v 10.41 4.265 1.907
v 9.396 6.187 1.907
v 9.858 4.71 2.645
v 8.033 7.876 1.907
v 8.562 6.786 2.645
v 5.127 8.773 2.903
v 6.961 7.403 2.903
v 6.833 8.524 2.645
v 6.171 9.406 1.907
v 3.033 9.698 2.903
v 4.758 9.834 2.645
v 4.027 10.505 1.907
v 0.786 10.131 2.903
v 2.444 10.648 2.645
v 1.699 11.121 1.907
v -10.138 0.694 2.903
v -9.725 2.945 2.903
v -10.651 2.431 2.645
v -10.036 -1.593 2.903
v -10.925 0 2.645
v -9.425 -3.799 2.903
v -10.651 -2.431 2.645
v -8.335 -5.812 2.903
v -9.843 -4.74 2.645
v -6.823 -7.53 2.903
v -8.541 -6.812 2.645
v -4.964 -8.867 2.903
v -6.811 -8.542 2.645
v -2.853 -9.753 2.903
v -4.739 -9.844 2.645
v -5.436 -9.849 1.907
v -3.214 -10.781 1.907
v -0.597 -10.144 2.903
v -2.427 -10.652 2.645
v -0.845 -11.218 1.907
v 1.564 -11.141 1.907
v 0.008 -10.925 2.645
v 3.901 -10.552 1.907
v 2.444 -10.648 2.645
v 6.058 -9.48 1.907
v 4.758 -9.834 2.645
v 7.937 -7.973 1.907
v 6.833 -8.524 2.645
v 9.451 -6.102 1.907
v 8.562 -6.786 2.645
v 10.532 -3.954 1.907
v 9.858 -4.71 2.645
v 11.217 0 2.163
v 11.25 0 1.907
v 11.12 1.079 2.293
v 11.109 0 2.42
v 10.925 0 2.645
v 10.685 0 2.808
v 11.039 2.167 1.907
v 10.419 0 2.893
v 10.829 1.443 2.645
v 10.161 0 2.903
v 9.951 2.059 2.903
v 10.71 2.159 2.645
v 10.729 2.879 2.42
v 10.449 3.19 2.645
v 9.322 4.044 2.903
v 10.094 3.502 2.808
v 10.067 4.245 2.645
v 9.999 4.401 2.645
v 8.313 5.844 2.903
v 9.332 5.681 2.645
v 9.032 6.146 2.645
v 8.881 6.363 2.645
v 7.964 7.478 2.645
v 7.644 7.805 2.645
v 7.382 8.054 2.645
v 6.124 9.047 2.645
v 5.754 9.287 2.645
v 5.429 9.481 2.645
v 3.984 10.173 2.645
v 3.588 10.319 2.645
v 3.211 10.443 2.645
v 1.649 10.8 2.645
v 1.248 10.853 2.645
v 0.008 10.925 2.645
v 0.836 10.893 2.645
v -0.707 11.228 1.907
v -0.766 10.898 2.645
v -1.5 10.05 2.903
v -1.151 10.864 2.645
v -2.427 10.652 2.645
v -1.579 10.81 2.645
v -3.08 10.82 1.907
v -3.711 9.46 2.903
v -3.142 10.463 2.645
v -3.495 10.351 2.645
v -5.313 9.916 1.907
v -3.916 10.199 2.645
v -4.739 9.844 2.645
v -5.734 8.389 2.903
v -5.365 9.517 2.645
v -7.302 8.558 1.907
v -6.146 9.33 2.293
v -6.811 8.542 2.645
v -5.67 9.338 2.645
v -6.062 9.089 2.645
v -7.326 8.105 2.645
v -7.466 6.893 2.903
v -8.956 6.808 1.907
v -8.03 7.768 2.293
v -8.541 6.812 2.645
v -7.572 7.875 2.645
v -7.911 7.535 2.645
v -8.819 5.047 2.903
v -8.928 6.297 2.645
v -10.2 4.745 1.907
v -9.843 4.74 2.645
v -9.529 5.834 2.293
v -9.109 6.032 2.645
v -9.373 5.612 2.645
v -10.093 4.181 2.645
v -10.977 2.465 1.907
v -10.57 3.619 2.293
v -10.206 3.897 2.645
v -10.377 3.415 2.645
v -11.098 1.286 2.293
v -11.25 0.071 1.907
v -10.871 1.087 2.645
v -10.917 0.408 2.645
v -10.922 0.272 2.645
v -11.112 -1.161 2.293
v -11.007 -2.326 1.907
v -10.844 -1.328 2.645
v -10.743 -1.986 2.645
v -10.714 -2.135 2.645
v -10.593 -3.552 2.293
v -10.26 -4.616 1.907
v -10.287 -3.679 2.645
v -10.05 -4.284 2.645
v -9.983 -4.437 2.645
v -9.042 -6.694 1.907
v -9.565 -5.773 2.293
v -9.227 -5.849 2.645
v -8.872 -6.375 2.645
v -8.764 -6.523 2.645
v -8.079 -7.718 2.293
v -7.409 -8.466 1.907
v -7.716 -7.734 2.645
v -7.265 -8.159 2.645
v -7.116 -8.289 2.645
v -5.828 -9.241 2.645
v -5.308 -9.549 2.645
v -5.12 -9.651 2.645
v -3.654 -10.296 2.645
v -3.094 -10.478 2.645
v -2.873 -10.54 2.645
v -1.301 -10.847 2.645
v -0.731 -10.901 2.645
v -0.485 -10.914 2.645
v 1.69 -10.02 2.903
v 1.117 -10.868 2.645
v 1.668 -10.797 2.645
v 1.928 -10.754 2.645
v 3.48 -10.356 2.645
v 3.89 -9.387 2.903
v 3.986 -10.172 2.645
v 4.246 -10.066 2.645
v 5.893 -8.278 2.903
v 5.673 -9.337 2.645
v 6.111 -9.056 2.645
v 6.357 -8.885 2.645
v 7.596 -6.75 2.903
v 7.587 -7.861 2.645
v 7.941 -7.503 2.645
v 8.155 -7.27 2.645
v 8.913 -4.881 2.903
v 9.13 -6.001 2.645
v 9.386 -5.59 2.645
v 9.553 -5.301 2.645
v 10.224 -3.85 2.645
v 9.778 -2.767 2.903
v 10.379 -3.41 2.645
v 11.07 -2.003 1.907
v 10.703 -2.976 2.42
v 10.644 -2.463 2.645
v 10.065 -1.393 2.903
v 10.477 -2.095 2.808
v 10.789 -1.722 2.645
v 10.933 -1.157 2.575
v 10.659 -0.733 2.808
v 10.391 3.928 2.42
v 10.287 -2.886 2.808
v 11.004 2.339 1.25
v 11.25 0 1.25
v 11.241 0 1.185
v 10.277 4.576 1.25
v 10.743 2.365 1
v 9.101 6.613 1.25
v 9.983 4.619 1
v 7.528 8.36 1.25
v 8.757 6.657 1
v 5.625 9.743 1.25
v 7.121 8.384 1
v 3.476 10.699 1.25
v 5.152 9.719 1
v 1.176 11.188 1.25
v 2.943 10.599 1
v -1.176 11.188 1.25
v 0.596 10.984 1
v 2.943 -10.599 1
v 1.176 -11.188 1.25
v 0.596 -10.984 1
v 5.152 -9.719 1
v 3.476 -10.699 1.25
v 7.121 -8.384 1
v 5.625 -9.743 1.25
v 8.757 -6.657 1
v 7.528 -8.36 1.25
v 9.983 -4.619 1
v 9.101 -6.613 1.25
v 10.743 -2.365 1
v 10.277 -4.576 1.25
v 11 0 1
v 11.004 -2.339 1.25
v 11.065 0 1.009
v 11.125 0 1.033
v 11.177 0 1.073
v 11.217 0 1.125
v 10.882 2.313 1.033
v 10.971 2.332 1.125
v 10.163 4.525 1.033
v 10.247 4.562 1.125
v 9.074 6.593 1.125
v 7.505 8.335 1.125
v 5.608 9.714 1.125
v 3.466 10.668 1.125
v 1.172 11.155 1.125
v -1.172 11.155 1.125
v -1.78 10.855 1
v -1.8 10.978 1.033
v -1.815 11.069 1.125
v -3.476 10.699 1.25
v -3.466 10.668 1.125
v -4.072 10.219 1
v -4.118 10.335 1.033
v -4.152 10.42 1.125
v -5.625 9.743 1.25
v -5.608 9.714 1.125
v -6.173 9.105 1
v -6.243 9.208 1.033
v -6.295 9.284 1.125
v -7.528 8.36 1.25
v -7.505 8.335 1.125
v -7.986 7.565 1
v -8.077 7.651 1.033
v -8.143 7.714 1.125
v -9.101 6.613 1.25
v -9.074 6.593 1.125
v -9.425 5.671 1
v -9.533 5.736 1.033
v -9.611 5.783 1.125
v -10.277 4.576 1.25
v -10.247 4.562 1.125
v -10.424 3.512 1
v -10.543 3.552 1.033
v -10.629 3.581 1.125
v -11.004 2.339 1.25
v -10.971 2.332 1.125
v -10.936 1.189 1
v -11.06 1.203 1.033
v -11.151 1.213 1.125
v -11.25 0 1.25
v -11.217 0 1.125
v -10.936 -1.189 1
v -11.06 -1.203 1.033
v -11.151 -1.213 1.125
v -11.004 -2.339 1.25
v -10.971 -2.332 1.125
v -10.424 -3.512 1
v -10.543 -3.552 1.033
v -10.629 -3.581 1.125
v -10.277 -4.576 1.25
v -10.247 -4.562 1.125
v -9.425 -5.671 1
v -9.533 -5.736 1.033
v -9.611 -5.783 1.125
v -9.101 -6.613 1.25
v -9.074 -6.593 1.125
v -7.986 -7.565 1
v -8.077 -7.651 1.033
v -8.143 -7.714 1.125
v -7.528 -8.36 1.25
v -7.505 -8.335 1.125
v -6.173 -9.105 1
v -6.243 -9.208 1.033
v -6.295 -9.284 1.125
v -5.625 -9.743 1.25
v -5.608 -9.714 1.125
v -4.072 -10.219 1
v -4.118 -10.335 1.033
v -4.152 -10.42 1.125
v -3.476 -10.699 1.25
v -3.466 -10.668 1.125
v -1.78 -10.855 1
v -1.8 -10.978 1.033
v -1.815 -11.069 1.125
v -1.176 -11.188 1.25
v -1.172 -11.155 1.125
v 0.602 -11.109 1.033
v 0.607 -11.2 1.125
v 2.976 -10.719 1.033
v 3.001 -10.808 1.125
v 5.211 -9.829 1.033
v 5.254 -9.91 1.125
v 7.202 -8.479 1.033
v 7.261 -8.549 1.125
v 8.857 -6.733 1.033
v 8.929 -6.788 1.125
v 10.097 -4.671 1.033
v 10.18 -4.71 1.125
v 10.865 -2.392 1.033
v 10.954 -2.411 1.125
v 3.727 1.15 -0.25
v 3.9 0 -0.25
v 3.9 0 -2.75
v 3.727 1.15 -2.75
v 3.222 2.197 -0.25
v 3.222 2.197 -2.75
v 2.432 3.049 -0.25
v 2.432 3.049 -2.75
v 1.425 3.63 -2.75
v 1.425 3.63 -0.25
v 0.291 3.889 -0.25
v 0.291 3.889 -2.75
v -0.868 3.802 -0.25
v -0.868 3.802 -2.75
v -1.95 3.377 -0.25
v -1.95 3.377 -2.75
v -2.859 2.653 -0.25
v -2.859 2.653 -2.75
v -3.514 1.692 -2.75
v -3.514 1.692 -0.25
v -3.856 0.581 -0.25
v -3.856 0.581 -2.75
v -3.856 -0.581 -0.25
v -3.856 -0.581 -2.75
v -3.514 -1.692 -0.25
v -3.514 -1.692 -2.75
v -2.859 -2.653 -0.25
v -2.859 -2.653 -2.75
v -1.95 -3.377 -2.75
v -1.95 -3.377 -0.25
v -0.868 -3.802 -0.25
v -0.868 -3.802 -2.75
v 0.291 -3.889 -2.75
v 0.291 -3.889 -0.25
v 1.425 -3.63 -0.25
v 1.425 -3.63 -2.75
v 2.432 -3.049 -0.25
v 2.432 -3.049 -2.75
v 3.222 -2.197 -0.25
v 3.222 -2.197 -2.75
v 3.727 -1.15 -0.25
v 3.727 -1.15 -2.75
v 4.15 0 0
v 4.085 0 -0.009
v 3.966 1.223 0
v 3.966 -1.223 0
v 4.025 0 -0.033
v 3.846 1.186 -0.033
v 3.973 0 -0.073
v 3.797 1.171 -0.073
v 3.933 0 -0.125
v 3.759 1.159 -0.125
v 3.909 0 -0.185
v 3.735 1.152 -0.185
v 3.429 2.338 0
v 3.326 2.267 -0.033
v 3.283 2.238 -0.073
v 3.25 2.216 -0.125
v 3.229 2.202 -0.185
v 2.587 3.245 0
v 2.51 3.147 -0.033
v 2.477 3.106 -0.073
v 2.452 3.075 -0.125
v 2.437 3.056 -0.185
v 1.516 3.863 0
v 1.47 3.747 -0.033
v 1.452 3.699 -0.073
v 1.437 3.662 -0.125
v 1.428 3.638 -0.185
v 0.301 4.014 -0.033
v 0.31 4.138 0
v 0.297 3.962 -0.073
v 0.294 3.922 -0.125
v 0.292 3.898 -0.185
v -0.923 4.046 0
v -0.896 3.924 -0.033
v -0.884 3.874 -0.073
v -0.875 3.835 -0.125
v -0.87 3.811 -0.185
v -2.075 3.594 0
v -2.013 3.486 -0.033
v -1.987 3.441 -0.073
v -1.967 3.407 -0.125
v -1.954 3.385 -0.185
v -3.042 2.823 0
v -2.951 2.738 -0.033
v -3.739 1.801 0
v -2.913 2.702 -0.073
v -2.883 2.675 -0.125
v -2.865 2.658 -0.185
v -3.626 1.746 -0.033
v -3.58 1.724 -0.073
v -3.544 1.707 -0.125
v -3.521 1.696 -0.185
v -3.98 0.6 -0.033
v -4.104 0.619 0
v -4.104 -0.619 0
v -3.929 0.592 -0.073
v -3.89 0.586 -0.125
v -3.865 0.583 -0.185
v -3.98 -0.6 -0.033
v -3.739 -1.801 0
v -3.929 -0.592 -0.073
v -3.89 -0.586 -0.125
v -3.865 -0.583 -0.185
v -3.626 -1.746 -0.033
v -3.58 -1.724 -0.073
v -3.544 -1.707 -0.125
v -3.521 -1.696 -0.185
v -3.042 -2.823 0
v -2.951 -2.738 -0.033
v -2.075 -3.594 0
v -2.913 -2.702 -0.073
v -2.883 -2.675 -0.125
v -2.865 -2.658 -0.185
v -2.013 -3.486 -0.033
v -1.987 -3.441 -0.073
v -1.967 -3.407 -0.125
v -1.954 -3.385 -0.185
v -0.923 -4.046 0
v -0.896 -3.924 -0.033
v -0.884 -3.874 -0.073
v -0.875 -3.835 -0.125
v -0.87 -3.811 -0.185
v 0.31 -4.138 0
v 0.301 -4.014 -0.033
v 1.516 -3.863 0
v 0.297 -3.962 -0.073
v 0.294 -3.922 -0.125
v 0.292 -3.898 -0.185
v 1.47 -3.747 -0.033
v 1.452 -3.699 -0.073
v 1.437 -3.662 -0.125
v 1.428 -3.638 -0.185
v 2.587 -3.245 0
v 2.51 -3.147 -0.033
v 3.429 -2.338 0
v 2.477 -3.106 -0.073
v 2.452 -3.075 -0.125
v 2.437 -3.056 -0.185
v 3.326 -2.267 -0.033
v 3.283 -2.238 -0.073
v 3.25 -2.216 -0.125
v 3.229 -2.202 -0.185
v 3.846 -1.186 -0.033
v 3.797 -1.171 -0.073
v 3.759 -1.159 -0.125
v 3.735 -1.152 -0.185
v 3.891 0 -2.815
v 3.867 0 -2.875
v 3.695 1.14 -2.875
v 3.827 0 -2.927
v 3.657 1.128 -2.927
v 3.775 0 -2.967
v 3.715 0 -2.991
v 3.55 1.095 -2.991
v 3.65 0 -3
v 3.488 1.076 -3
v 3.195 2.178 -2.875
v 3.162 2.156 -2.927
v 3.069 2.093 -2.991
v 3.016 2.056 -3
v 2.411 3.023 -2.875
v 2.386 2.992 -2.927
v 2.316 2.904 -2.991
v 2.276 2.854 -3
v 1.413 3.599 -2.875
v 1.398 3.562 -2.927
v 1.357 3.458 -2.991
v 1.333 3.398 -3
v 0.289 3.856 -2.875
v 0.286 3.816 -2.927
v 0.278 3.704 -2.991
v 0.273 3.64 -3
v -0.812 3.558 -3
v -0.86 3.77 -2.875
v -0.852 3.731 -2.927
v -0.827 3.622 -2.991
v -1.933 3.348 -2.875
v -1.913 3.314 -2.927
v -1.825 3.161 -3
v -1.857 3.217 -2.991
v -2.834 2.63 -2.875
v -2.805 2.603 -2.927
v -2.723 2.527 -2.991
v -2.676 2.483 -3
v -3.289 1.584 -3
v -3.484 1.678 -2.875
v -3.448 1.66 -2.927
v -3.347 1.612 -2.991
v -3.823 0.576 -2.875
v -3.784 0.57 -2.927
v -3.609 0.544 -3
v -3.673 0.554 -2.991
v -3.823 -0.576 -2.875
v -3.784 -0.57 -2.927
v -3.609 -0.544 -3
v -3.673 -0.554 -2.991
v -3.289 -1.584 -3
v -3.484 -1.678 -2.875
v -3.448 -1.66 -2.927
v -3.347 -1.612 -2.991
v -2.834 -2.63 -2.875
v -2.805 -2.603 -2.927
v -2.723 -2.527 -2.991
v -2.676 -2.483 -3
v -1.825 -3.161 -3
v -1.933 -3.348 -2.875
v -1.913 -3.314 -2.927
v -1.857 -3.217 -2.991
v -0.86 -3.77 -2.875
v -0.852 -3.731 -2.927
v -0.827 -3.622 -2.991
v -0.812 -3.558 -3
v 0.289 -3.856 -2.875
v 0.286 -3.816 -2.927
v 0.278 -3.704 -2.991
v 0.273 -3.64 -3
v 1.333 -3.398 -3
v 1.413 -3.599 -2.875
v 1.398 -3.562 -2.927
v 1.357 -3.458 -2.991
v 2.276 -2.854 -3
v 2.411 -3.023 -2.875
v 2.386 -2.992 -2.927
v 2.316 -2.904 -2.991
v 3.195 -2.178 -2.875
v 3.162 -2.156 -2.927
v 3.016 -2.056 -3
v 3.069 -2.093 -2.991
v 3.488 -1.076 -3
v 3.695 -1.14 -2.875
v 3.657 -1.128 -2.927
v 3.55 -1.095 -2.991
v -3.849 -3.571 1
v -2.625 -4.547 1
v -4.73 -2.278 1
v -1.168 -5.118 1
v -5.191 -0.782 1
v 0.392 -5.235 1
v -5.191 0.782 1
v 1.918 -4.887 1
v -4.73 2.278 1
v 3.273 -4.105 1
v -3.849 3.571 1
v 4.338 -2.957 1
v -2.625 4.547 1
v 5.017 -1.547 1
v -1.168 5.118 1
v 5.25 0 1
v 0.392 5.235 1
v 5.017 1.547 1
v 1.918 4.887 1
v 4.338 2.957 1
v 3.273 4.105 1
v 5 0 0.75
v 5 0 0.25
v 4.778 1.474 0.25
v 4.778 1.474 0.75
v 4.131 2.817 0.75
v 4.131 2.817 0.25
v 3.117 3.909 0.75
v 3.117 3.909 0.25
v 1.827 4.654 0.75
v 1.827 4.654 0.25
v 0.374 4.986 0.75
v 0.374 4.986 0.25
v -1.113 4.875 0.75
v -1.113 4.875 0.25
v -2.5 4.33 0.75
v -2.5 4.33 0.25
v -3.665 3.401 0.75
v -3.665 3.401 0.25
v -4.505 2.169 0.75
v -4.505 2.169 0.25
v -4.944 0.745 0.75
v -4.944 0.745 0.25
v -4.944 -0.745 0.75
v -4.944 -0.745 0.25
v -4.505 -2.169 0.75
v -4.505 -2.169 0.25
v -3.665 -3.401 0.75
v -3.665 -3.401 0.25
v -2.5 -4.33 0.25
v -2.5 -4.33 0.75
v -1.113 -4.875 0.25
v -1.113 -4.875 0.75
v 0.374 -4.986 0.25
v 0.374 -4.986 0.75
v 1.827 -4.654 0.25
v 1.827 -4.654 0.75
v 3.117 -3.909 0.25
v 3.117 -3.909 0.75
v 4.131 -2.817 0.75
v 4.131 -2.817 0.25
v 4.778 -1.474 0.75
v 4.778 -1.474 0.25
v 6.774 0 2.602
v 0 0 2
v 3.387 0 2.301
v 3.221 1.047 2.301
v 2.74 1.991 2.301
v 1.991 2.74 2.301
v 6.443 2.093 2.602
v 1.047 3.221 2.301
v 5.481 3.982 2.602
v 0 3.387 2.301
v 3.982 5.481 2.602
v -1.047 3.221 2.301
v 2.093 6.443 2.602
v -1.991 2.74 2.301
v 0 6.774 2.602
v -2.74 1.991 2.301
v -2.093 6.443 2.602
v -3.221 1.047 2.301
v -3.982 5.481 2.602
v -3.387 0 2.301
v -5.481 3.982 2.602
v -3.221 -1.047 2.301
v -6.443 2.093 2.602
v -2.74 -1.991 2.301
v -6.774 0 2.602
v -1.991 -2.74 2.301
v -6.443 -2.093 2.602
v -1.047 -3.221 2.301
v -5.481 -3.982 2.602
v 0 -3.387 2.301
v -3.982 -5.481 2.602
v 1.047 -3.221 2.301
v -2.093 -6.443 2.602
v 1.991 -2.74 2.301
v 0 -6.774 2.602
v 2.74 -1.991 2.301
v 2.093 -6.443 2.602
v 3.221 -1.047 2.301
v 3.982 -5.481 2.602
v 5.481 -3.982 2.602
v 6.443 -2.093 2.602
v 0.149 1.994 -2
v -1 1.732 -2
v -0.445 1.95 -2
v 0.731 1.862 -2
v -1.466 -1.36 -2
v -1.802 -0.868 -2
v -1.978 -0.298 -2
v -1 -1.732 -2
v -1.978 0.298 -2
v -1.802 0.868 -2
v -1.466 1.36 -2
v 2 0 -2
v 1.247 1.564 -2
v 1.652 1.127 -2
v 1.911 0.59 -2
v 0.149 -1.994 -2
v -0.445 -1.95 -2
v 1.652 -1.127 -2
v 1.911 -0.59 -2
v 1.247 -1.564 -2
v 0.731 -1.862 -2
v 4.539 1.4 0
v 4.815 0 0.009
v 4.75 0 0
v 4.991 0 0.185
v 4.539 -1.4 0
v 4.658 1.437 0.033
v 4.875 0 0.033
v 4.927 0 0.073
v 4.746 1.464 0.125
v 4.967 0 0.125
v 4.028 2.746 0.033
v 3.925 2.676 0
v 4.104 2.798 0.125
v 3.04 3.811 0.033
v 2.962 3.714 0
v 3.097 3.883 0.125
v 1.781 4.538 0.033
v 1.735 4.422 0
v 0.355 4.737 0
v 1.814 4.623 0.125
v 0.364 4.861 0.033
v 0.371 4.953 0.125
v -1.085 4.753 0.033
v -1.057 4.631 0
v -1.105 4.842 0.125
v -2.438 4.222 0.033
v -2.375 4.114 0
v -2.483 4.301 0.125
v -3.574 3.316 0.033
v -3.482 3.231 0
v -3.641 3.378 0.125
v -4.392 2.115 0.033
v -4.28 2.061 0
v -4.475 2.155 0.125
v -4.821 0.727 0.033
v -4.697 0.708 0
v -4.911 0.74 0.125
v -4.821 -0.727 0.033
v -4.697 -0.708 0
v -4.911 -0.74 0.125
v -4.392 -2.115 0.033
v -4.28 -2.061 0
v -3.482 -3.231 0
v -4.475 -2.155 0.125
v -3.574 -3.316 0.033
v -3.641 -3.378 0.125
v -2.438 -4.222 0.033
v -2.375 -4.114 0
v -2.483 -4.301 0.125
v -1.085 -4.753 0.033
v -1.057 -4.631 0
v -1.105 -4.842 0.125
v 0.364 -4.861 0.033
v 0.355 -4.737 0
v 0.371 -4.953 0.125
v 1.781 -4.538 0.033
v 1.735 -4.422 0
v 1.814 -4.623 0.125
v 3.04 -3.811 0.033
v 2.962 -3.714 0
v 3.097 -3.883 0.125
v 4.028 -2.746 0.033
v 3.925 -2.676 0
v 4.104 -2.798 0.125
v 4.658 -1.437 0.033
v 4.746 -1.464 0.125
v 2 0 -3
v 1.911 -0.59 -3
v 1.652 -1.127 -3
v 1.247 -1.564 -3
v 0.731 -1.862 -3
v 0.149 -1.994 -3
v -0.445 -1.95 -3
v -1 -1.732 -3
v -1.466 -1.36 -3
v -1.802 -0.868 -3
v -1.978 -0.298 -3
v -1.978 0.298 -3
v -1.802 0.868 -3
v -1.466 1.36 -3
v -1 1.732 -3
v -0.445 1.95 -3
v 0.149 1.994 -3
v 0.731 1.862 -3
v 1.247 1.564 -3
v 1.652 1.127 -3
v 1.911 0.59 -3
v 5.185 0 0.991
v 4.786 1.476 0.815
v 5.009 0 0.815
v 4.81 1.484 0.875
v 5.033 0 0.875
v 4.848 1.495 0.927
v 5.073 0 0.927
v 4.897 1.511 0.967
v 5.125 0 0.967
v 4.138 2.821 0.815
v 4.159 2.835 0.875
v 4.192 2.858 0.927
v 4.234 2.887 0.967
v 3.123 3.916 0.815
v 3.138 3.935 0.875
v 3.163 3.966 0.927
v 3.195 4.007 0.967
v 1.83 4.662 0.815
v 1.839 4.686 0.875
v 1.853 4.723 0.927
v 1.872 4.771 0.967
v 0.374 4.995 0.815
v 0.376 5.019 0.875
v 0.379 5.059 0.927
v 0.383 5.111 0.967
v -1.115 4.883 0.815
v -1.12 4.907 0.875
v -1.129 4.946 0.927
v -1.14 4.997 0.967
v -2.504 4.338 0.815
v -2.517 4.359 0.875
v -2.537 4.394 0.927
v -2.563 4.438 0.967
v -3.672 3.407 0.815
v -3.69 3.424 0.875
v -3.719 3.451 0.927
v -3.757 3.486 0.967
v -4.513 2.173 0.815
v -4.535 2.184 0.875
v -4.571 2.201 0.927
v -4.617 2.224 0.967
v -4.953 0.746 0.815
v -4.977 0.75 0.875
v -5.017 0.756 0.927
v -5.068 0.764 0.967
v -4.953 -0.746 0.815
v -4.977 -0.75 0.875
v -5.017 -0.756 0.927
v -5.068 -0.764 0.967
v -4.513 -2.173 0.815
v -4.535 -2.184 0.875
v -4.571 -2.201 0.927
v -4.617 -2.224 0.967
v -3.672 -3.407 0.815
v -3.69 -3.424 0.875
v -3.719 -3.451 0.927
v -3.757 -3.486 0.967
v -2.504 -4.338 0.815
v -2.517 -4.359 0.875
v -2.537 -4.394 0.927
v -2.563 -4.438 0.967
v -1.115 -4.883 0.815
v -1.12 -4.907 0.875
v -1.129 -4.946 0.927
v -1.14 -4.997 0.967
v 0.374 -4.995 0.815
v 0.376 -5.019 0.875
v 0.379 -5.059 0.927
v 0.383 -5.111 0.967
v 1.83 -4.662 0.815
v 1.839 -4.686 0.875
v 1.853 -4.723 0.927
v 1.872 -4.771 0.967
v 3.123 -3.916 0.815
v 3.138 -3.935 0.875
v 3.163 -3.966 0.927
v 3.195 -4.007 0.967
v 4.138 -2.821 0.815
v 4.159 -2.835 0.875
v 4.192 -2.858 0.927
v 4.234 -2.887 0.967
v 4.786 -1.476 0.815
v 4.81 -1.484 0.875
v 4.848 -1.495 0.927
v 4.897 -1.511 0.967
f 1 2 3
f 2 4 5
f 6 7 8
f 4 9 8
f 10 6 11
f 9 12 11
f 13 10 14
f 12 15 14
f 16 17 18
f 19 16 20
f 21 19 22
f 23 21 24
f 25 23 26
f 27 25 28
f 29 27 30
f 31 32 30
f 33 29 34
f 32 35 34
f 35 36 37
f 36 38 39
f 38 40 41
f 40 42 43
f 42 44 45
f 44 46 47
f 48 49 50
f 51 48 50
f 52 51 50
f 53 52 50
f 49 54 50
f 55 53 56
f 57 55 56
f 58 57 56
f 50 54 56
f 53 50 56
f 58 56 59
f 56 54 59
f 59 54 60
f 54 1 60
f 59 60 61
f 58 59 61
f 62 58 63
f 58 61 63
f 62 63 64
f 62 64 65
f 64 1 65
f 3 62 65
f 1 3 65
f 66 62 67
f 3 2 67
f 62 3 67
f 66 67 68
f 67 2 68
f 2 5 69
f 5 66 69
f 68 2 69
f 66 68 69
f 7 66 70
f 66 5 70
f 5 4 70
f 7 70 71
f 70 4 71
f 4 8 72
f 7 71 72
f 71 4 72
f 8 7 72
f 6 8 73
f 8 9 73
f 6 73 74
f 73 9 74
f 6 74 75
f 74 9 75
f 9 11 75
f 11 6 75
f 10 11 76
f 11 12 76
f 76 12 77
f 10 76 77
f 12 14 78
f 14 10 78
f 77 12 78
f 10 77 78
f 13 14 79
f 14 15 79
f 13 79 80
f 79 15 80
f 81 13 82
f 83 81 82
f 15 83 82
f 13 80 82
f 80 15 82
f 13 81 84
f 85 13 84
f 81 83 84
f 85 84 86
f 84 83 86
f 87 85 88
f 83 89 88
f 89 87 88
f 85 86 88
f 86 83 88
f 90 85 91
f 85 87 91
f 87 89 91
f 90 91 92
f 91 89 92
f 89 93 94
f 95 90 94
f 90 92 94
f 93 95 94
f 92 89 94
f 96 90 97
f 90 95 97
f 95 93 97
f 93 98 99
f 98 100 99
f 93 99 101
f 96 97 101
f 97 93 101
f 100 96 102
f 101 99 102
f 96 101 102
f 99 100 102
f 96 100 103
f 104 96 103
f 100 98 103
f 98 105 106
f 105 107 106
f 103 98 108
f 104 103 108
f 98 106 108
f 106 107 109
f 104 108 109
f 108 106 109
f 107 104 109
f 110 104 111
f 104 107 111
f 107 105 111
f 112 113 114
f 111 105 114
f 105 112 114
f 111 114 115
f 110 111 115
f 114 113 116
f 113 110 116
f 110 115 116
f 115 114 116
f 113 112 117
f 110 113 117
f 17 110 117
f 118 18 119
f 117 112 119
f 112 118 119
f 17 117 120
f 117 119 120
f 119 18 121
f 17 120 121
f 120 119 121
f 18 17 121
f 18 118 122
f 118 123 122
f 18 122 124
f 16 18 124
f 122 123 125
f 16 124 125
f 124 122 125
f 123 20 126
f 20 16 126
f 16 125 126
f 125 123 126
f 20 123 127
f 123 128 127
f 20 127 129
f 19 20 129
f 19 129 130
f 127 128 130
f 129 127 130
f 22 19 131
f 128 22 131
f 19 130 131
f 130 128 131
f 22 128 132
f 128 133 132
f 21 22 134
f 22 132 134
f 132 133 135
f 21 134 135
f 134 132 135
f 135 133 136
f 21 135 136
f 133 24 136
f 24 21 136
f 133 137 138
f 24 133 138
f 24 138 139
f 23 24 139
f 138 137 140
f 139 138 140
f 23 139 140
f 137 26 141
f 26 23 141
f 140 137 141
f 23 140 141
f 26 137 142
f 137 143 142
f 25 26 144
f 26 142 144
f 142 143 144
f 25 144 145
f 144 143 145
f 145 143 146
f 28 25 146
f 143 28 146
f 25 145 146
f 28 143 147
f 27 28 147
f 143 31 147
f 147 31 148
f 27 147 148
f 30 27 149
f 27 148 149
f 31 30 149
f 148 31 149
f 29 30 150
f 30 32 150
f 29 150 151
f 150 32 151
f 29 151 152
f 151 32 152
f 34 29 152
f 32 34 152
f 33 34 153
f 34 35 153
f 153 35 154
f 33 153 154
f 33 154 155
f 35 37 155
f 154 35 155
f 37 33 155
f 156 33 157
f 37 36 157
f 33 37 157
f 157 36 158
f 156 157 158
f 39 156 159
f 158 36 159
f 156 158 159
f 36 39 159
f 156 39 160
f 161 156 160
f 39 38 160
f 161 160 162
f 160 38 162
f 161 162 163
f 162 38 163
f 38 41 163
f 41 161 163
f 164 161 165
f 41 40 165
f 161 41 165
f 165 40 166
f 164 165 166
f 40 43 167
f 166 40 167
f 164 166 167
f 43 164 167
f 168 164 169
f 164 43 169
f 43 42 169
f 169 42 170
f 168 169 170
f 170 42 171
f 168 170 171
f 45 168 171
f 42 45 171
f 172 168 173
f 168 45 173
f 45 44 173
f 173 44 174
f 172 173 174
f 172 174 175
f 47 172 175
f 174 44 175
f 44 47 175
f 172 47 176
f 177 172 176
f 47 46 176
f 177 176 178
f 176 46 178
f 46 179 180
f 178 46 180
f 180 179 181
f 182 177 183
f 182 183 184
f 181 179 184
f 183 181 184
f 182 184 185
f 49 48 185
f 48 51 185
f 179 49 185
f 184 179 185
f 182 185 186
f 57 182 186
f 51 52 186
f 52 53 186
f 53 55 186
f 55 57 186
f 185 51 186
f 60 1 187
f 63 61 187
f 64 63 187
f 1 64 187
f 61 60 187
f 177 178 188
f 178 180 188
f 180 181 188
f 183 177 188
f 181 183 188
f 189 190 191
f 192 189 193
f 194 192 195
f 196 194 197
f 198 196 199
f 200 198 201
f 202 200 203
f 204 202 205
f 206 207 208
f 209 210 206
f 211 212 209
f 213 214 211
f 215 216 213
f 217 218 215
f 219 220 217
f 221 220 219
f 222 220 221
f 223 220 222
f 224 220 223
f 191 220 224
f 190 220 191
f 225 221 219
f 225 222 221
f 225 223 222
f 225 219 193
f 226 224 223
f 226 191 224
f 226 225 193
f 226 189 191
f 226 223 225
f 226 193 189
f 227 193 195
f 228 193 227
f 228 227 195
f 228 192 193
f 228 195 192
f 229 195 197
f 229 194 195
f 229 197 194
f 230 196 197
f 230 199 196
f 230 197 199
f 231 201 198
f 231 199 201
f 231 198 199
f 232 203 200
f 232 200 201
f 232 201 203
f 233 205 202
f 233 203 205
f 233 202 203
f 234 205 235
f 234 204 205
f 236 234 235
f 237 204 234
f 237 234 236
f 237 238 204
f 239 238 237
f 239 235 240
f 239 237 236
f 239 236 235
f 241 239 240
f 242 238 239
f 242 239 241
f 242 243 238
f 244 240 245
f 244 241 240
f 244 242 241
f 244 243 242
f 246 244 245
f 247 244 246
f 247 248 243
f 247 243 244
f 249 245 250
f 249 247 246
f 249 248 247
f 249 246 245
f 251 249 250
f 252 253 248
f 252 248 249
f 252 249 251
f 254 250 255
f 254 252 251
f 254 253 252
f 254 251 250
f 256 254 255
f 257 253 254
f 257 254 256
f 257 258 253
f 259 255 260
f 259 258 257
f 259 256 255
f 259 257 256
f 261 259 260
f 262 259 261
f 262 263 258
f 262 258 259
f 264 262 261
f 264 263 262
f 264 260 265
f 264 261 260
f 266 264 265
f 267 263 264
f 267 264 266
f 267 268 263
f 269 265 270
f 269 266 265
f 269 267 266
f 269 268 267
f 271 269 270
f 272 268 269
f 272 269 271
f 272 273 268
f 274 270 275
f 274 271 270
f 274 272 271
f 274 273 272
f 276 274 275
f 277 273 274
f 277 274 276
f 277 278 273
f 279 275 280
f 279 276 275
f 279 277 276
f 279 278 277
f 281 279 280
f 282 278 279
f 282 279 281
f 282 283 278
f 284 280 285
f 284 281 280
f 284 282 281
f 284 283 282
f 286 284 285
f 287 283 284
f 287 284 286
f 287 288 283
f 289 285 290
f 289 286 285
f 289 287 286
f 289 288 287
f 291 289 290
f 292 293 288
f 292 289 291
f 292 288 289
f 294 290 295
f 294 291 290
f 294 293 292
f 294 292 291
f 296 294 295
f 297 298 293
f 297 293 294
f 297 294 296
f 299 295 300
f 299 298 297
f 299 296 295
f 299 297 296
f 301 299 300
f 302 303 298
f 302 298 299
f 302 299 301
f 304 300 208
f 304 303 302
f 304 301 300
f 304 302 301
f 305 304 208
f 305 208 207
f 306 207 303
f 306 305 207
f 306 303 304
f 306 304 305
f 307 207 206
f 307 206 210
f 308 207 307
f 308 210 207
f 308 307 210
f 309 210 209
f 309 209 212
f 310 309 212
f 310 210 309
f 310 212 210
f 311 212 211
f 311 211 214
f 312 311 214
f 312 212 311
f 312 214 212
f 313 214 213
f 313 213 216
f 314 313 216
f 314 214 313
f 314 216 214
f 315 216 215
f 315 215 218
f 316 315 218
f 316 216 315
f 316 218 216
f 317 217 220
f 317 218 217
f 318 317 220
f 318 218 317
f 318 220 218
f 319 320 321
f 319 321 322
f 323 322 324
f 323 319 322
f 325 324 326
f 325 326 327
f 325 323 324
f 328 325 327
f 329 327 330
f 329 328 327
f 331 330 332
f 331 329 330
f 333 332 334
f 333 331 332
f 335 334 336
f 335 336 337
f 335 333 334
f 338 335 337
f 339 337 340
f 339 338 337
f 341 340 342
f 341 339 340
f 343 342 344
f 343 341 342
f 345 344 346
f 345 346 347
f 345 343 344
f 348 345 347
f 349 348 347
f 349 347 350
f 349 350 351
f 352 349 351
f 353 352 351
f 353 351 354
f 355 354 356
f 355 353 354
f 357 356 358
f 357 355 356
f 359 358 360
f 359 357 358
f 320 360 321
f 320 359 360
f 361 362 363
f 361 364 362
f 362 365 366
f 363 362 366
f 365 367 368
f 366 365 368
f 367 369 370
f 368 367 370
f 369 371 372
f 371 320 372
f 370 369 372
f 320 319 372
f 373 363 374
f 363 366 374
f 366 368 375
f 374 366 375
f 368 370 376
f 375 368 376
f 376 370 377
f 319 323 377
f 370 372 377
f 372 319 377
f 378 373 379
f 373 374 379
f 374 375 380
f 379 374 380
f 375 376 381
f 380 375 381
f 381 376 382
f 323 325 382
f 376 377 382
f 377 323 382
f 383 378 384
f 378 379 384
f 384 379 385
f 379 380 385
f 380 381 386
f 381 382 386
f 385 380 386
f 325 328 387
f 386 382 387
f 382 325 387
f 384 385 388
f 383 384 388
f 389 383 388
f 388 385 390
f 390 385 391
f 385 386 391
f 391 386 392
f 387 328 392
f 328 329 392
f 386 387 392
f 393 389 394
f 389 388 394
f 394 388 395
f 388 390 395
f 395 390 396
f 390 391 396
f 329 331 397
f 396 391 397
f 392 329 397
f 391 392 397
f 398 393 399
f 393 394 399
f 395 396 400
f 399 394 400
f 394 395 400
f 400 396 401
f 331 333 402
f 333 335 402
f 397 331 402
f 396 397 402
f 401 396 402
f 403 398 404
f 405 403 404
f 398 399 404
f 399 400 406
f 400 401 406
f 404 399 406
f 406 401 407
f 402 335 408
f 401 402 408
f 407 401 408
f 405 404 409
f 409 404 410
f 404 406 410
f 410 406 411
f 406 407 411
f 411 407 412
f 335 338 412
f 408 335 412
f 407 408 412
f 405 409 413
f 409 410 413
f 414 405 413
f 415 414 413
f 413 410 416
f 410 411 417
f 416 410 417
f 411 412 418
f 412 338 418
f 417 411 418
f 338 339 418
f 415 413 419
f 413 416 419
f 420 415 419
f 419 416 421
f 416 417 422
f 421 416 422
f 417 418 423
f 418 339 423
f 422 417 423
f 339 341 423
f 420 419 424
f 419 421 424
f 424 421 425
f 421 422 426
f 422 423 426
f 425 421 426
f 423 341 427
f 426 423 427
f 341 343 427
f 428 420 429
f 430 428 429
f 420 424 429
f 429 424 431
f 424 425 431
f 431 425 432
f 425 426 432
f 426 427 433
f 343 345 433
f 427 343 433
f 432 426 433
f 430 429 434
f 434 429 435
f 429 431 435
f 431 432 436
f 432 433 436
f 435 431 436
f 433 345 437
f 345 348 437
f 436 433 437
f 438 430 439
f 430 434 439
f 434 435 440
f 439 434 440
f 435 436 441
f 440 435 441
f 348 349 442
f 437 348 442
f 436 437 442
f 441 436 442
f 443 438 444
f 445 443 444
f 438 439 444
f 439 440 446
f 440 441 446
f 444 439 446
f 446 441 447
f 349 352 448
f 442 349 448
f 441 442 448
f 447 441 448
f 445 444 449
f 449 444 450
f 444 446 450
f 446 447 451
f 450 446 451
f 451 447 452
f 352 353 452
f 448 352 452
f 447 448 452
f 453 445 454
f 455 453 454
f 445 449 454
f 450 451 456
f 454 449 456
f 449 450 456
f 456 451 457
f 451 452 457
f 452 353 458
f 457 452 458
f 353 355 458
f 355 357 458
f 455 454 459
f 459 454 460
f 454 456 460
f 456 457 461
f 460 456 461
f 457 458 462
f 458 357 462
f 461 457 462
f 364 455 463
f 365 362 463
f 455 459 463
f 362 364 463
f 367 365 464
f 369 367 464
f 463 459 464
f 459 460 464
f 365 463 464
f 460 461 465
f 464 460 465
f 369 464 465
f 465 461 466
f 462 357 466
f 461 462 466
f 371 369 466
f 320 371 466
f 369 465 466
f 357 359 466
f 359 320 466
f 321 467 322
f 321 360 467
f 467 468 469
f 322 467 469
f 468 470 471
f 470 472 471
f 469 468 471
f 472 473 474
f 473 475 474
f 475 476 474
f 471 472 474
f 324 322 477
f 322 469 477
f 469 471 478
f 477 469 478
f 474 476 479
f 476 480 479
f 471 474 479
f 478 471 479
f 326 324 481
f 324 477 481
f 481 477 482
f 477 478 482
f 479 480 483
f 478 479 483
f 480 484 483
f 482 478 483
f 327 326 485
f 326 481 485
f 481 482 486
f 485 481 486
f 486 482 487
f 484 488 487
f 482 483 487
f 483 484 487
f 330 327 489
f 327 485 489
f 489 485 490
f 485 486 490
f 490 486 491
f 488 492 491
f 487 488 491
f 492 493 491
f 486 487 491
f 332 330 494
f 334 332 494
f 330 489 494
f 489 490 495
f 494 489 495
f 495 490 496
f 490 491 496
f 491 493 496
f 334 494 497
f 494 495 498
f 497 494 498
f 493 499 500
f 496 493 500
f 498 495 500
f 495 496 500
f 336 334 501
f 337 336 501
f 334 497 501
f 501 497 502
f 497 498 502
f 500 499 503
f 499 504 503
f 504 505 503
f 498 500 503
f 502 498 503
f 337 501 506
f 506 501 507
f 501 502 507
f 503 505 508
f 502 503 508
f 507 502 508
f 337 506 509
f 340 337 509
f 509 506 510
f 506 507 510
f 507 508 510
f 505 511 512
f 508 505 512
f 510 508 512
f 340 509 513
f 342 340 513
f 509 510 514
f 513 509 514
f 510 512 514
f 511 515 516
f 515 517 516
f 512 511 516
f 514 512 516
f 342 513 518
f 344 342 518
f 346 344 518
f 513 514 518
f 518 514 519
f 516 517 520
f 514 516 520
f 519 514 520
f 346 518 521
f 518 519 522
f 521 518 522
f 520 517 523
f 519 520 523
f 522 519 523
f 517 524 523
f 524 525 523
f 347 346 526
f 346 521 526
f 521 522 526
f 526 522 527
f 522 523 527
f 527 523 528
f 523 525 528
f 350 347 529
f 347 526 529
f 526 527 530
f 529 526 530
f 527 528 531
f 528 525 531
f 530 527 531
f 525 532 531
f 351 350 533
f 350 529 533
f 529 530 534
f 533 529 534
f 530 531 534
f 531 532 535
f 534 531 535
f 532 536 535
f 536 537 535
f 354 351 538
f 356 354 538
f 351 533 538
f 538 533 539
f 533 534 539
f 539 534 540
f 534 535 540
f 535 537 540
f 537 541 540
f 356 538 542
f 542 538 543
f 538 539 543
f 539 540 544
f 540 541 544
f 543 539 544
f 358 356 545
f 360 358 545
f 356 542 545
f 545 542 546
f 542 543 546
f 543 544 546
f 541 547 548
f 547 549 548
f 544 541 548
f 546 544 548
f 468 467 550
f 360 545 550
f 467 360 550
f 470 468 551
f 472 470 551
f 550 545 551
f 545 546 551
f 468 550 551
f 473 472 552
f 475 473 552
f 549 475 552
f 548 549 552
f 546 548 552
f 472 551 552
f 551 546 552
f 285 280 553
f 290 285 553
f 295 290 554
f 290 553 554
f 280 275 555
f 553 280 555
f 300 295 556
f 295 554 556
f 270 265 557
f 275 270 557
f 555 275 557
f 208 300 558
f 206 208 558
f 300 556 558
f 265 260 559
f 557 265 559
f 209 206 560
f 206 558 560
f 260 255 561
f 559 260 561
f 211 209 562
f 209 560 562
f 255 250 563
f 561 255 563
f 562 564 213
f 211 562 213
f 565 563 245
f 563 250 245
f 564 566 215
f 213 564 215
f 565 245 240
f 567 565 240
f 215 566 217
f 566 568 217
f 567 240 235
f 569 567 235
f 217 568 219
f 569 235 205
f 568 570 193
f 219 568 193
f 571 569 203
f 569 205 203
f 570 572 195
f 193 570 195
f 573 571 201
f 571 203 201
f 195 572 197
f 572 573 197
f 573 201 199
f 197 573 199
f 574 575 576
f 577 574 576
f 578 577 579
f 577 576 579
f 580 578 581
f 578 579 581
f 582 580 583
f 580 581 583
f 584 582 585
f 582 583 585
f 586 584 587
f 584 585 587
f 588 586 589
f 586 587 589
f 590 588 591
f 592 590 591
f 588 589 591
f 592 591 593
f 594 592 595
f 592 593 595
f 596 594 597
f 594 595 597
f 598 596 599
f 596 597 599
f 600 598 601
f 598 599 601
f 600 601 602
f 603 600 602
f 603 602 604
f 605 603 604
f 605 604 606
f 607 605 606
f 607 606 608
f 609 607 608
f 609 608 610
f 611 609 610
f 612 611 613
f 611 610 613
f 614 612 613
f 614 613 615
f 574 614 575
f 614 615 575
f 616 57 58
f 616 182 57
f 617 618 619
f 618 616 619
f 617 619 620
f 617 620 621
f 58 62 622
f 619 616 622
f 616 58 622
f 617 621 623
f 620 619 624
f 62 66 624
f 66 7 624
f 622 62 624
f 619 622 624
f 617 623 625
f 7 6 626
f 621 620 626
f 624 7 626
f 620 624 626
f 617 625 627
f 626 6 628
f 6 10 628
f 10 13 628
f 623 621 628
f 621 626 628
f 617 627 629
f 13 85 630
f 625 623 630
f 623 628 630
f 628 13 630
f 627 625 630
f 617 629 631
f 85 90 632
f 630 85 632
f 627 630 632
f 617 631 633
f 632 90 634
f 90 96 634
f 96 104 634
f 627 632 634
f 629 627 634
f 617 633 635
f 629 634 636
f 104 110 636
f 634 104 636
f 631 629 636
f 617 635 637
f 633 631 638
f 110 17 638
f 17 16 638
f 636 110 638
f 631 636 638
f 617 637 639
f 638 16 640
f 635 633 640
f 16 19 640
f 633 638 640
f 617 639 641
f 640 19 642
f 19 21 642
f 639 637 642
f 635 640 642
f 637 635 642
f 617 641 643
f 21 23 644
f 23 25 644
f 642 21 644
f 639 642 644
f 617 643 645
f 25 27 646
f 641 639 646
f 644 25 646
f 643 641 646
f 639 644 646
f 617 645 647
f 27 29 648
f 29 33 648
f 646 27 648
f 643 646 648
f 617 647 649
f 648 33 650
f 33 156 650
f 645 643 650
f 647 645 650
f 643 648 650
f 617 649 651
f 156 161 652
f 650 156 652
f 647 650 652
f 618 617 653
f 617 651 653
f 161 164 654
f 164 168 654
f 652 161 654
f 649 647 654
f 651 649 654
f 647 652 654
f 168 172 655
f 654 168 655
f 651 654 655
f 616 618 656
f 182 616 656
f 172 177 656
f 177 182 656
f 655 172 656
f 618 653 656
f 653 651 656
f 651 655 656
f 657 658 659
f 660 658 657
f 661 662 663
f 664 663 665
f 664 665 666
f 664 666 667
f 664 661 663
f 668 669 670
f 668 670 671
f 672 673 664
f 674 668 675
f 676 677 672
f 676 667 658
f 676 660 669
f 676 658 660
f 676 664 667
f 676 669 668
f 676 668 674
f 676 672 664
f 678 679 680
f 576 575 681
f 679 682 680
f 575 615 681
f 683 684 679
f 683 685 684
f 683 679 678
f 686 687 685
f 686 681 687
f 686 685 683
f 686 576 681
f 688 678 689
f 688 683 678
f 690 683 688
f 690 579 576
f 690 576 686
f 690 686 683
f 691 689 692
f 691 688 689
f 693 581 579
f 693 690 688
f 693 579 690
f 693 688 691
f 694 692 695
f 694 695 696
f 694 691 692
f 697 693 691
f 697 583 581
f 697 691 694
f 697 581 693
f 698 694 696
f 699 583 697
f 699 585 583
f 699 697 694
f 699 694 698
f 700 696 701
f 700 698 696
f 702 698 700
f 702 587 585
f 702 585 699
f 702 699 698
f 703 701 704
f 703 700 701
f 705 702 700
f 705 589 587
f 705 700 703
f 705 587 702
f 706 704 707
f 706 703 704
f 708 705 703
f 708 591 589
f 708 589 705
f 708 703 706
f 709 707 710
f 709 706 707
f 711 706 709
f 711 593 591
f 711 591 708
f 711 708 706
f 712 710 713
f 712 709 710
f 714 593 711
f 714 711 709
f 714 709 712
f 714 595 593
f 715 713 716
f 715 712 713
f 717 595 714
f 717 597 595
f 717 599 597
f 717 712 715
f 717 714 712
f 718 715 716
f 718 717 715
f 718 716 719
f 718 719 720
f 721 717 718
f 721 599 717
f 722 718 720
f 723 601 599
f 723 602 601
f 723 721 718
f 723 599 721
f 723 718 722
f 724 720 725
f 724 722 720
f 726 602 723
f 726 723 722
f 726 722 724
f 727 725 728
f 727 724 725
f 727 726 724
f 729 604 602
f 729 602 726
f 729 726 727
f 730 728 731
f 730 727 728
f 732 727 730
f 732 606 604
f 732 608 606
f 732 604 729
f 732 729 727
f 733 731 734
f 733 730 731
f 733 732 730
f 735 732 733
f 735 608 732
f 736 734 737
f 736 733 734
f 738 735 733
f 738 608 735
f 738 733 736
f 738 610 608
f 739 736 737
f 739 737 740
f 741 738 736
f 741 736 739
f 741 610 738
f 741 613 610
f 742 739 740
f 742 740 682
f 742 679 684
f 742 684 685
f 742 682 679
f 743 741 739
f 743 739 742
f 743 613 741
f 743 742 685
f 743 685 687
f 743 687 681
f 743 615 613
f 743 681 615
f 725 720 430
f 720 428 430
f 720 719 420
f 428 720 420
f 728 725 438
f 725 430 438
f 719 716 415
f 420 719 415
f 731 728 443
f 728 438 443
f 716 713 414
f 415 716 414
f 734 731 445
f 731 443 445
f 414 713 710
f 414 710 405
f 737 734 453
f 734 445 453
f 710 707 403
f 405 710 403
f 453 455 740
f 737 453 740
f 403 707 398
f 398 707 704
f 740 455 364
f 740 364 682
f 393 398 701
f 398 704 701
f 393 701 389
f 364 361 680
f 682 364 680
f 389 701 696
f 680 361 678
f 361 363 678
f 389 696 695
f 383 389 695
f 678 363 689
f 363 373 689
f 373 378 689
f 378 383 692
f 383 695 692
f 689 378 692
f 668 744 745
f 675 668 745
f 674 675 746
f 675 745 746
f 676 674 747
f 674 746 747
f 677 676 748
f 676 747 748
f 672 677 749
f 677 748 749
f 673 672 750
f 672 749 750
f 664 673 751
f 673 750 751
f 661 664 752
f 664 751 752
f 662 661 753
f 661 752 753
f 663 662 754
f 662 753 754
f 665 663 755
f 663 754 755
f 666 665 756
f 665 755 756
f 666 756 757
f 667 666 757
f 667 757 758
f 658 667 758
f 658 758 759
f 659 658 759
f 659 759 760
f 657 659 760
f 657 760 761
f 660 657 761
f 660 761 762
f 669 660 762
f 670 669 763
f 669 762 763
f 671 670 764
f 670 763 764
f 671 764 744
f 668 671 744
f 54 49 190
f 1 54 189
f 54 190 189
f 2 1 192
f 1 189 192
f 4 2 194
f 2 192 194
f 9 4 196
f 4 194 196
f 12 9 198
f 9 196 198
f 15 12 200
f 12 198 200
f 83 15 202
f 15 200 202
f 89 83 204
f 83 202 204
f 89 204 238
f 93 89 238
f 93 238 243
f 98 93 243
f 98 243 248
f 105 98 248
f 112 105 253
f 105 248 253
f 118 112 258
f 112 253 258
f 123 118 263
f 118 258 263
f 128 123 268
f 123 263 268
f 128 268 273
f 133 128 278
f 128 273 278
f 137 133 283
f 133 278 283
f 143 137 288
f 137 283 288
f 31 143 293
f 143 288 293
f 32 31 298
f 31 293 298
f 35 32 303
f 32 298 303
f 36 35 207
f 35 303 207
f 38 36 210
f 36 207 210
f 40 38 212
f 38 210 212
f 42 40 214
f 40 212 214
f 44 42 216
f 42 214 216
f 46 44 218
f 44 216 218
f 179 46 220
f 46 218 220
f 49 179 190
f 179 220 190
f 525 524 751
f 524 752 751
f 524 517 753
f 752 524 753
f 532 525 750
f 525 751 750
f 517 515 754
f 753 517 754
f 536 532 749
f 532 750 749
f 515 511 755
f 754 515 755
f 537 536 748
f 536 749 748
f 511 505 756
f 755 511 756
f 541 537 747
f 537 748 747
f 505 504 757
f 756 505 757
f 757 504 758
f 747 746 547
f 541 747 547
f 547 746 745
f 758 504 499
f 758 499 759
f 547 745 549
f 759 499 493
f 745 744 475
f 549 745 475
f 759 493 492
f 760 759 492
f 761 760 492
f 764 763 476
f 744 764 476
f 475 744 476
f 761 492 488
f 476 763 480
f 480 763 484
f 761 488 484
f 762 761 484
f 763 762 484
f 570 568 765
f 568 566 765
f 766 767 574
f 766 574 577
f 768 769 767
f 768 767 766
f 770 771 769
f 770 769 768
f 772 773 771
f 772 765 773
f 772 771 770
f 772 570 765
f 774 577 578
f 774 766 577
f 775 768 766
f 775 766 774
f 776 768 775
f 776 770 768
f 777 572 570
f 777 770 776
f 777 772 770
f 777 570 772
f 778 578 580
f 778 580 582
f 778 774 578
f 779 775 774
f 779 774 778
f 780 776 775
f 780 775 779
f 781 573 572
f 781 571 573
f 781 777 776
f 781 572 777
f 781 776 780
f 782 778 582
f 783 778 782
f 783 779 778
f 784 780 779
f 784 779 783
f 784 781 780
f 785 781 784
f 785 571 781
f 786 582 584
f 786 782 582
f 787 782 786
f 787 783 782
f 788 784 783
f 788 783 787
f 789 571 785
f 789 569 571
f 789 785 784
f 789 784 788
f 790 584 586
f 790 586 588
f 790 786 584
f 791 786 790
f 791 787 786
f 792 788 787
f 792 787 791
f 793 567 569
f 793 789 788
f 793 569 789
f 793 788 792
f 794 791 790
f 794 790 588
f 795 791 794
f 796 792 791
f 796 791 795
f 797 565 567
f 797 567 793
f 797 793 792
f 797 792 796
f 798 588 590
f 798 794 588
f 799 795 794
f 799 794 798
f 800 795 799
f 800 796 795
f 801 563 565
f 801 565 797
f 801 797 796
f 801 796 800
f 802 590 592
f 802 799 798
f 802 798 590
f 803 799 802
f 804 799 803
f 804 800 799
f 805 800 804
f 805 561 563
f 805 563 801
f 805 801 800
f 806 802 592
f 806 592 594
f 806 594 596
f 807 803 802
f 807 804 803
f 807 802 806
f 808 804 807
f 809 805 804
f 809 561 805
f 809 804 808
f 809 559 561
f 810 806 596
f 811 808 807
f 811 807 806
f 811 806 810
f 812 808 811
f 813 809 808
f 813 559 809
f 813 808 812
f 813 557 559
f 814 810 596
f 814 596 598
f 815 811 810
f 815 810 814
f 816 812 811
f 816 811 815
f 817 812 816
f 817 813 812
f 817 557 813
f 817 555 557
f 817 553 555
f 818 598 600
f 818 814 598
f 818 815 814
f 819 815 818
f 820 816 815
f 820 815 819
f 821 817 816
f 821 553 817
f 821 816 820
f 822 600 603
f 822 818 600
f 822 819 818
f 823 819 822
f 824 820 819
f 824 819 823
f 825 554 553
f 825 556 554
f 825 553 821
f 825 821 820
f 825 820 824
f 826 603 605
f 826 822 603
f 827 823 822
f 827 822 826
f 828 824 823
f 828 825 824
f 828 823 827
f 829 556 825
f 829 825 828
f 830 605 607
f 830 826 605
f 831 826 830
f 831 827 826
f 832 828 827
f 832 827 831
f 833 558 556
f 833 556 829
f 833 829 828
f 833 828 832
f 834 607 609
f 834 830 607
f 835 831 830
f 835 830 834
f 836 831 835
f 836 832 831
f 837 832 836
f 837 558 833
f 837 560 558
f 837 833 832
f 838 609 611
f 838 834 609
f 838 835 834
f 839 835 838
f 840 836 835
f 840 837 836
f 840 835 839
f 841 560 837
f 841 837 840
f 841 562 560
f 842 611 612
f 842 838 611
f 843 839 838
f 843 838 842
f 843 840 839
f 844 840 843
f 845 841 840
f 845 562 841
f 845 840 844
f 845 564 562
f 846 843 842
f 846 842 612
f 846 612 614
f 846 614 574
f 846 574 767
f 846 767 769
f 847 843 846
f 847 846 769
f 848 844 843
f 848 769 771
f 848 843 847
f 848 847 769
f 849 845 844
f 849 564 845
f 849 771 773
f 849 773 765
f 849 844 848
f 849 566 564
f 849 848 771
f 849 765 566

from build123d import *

# Parameters (mm, degrees)
F0_R     = 3.9
F1_DEPTH = 3
F0_R_2   = 5
F2_DEPTH = 1
F3_R     = 11.25
F4_DEPTH = 2
F7_R     = 1
F8_R     = 2
F9_DEPTH = 1
F10_R    = 0.25
F11_R    = 0.25
F12_R    = 0.25


with BuildPart() as f1:
    # F0 (on Top) → F1 (new body)
    with BuildSketch(Plane.XY):
        Circle(F0_R)
    extrude(amount=-F1_DEPTH)

    # F0 (on Top) → F2 (join)
    with BuildSketch(Plane.XY):
        Circle(F0_R_2)
        Circle(F0_R, mode=Mode.SUBTRACT)
        Circle(F0_R)
    extrude(amount=F2_DEPTH)

    # F3 (on face) → F4 (join)
    with BuildSketch(Plane.XY.offset(1)):
        Circle(F3_R)
    extrude(amount=F4_DEPTH)

    # F5 (on Front) → F6 (revolve, cut)
    with BuildSketch(Plane.XZ):
        Polygon((0, 2), (11.25, 3), (0, 3), align=None)
    revolve(axis=Axis((0, 0, 1), (0, 0, 1)), mode=Mode.SUBTRACT)

    # F7
    f7_edges = [f1.edges().sort_by_distance(p)[0] for p in [
        (-11.25, 0, 3),
    ]]
    fillet(f7_edges, radius=F7_R)

    # F8 (on face) → F9 (cut)
    with BuildSketch(Plane(origin=(0, 0, -3), x_dir=(1, 0, 0), z_dir=(0, 0, -1))):
        Circle(F8_R)
    extrude(amount=-F9_DEPTH, mode=Mode.SUBTRACT)

    # F10
    f10_edges = [f1.edges().sort_by_distance(p)[0] for p in [
        (-3.9, 0, -3),
    ]]
    fillet(f10_edges, radius=F10_R)

    # F11
    f11_edges = [f1.edges().sort_by_distance(p)[0] for p in [
        (-5, 0, 0),
    ]]
    fillet(f11_edges, radius=F11_R)

    # F12
    f12_edges = [f1.edges().sort_by_distance(p)[0] for p in [
        (-3.9, 0, 0),
        (-11.25, 0, 1),
        (-5, 0, 1),
    ]]
    fillet(f12_edges, radius=F12_R)


solid = f1.part
